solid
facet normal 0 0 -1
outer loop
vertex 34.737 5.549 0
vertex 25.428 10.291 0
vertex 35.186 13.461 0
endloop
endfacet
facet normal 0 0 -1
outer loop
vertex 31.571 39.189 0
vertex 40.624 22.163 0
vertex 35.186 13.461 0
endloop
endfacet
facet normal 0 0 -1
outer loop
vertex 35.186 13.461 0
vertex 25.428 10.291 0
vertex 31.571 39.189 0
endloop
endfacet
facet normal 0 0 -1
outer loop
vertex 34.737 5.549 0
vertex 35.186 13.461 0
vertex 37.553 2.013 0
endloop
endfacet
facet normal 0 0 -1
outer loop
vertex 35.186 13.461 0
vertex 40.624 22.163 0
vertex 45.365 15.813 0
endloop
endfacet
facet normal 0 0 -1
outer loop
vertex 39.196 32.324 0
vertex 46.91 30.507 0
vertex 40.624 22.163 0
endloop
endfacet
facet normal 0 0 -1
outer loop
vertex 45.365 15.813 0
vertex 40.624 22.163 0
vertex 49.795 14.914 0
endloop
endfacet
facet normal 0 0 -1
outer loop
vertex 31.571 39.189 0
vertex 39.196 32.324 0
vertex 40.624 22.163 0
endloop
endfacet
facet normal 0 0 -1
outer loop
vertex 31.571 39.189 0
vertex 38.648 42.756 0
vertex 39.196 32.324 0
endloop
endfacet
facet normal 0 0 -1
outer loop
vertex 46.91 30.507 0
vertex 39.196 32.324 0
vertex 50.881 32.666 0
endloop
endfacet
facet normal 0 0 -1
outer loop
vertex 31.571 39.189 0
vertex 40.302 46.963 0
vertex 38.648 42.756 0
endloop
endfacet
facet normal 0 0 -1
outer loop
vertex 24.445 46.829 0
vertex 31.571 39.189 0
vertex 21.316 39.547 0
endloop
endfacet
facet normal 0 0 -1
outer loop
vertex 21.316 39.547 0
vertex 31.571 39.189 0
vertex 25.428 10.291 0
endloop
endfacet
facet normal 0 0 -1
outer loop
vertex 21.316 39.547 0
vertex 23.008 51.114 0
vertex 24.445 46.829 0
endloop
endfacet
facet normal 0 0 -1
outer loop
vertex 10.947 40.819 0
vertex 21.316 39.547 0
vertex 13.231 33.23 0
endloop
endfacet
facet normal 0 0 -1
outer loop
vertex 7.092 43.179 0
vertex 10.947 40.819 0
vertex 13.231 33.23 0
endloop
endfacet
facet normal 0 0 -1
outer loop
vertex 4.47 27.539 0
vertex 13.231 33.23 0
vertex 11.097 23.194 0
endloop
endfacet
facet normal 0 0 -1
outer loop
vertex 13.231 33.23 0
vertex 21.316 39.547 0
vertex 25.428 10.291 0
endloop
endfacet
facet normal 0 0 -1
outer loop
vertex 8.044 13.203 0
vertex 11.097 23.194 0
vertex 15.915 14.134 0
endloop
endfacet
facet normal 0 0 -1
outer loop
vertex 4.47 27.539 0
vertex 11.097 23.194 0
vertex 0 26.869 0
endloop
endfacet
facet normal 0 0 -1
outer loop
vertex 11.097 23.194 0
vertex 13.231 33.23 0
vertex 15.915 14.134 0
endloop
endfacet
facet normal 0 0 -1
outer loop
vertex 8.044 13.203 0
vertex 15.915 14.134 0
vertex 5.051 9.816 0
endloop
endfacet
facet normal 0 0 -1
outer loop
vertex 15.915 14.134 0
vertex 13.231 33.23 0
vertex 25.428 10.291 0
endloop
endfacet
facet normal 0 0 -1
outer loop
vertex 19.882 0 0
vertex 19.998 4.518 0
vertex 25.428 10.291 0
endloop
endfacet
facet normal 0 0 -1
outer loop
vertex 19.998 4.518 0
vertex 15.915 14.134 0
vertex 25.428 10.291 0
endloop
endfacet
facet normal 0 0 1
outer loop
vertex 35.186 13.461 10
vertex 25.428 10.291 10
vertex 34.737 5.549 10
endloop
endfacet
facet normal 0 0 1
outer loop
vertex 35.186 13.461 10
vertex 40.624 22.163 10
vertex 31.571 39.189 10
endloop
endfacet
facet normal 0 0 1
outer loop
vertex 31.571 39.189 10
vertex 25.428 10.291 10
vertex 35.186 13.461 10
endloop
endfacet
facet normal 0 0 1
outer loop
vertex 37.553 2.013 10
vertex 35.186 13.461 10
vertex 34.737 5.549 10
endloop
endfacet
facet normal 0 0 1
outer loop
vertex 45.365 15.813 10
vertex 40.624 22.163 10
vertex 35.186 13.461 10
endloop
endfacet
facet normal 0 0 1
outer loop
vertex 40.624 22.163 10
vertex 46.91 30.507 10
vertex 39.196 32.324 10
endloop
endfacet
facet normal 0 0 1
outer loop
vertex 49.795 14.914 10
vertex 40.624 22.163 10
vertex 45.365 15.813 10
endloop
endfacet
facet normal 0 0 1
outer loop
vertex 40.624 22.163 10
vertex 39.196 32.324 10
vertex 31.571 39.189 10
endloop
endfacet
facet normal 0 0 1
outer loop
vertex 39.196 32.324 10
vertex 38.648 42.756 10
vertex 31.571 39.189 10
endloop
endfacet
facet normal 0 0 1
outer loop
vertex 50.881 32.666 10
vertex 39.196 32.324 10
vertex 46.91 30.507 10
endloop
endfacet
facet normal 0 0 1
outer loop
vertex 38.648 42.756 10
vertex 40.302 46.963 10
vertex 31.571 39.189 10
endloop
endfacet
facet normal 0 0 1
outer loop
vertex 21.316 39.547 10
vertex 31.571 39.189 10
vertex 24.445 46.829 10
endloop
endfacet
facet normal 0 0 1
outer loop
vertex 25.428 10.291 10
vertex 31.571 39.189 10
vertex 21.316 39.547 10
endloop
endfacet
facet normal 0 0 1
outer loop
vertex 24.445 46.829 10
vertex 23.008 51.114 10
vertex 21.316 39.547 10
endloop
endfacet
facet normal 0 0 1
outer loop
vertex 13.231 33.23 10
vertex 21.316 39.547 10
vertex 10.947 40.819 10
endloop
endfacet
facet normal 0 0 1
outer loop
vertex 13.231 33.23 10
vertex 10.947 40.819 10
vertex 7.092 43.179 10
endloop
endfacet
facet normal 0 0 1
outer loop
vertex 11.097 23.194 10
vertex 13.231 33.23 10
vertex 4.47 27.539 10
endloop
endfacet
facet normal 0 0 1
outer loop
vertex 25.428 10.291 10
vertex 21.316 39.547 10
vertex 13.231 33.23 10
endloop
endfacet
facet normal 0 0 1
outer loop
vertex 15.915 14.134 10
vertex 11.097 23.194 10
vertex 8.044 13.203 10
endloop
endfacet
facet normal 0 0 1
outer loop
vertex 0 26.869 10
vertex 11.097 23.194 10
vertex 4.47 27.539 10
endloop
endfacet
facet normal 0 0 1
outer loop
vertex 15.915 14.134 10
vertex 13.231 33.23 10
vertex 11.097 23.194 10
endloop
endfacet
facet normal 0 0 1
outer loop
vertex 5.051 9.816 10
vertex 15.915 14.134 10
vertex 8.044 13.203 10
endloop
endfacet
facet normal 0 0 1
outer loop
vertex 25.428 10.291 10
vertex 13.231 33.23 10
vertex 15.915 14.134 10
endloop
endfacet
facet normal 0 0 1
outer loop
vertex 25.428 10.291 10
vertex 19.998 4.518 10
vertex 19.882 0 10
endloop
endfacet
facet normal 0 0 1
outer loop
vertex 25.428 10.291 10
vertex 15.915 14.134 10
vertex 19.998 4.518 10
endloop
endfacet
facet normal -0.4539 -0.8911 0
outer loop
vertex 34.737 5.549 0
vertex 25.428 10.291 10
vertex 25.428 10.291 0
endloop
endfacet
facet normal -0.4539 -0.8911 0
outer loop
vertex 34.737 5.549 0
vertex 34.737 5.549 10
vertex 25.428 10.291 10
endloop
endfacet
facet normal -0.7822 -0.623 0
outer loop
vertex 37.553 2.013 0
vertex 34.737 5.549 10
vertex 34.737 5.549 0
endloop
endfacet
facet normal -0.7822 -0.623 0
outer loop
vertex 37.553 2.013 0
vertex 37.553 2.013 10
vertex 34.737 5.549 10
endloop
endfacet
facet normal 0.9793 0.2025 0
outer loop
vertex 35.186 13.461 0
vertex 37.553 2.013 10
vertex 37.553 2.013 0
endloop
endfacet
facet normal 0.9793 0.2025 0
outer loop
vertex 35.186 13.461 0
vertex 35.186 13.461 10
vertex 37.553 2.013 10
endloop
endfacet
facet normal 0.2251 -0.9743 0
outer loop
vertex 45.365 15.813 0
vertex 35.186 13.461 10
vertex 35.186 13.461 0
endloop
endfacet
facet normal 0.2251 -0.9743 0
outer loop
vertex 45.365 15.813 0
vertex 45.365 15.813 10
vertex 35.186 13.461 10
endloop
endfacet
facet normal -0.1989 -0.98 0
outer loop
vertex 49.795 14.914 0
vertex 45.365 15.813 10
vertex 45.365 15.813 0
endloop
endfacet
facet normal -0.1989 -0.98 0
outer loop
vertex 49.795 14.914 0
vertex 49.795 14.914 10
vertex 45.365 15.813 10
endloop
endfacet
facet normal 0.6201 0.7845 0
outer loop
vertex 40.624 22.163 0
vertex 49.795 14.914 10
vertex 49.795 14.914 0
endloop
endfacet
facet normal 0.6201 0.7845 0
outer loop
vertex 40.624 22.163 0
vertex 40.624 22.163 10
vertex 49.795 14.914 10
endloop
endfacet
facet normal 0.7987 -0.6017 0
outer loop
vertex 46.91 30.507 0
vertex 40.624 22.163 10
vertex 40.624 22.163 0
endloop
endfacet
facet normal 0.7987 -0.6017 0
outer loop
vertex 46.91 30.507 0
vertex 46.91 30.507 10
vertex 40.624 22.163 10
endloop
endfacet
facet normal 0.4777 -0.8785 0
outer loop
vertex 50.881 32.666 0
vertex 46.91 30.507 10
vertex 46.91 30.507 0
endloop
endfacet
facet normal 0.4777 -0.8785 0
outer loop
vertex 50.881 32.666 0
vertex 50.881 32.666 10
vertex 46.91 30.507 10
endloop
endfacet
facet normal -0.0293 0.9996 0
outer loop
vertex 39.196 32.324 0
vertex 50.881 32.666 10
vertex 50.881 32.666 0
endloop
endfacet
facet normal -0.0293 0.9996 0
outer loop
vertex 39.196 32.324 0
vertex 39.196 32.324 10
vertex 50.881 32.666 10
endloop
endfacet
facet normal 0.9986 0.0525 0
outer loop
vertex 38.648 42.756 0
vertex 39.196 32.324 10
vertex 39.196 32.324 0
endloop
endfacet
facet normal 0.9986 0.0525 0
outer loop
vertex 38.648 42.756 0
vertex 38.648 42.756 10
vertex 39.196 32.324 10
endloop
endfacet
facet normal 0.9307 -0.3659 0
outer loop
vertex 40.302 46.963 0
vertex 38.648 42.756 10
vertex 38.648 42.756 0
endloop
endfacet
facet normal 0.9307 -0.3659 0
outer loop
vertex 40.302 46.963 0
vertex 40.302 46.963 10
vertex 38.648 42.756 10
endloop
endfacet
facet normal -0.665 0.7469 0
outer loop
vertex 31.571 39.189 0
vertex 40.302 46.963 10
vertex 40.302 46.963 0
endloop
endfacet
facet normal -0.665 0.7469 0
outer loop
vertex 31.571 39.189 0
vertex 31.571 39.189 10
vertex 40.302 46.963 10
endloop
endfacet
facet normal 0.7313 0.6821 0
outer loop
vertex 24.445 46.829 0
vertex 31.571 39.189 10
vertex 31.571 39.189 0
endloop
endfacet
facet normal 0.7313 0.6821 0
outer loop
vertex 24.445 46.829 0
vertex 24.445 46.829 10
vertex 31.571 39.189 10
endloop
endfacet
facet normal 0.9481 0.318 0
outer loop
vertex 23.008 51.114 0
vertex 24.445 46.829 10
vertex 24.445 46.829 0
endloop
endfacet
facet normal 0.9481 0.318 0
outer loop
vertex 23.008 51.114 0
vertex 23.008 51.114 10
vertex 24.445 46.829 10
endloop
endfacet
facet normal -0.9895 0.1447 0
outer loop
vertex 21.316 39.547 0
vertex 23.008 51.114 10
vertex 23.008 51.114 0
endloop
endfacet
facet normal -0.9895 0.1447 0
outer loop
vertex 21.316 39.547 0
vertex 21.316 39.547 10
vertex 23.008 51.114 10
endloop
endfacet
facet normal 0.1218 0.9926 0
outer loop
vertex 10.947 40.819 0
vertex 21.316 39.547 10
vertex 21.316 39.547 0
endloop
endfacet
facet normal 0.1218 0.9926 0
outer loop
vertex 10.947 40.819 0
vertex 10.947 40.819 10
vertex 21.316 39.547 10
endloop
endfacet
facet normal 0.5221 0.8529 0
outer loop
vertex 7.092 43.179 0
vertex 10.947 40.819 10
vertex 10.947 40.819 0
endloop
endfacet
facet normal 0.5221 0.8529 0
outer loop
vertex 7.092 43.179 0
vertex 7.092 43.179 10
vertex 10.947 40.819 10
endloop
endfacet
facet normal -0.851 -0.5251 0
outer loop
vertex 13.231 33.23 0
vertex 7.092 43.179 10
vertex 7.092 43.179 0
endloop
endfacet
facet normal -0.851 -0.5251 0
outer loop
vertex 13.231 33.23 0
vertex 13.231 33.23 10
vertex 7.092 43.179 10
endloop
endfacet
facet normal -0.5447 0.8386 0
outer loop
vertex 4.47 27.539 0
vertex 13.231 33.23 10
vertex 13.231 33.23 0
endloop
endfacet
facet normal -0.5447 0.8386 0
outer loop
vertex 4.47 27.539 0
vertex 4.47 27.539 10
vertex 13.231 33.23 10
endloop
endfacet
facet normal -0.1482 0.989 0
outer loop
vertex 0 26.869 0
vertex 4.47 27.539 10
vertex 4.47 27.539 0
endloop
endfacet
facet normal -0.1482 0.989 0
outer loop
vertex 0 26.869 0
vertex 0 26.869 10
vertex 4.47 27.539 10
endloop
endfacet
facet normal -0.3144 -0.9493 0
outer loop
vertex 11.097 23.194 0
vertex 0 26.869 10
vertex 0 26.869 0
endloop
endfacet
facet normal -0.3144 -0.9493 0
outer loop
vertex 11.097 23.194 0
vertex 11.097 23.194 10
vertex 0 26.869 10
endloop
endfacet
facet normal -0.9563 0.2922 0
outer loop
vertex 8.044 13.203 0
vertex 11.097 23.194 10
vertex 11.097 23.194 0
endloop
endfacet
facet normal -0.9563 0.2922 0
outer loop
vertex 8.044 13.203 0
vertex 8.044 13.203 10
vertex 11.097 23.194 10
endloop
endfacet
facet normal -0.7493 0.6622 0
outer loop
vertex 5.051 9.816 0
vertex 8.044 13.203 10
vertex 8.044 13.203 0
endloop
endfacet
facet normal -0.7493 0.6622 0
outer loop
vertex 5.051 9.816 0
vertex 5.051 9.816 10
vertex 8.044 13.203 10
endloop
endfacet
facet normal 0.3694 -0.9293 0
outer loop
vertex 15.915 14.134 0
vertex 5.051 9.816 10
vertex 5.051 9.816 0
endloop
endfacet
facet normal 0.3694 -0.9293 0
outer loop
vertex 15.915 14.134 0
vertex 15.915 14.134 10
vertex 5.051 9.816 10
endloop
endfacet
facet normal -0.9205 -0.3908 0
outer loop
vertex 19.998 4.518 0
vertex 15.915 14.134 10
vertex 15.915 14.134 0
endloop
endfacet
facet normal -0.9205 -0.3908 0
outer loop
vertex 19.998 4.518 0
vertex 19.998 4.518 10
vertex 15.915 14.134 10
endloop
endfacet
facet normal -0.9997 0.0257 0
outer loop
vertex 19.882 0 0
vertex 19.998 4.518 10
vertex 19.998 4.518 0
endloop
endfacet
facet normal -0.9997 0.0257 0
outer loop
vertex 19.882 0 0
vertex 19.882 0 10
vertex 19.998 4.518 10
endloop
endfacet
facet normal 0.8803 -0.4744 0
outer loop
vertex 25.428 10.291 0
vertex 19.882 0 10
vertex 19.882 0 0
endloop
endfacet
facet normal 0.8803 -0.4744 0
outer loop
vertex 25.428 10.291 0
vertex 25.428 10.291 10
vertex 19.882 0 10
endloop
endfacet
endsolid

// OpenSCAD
$fn = 32;

// ----------------------------------------------------------------------
// Fan rotor section: 9 blades, 15 mm hub radius, 11 mm blades
// ----------------------------------------------------------------------

// --- parameters (mm) ---
profile_height = 10;      // extrusion height
profile_points = 27;      // points of the closed outline

profile = [[40.624, 22.163], [46.91, 30.507], [50.881, 32.666], [39.196, 32.324], [38.648, 42.756], [40.302, 46.963], [31.571, 39.189], [24.445, 46.829], [23.008, 51.114], [21.316, 39.547], [10.947, 40.819], [7.092, 43.179], [13.231, 33.23], [4.47, 27.539], [0, 26.869], [11.097, 23.194], [8.044, 13.203], [5.051, 9.816], [15.915, 14.134], [19.998, 4.518], [19.882, 0], [25.428, 10.291], [34.737, 5.549], [37.553, 2.013], [35.186, 13.461], [45.365, 15.813], [49.795, 14.914]];  // single closed polygon, 27 points, counter clockwise

// --- the one profile operation ---
linear_extrude(height = profile_height) polygon(points = profile);
